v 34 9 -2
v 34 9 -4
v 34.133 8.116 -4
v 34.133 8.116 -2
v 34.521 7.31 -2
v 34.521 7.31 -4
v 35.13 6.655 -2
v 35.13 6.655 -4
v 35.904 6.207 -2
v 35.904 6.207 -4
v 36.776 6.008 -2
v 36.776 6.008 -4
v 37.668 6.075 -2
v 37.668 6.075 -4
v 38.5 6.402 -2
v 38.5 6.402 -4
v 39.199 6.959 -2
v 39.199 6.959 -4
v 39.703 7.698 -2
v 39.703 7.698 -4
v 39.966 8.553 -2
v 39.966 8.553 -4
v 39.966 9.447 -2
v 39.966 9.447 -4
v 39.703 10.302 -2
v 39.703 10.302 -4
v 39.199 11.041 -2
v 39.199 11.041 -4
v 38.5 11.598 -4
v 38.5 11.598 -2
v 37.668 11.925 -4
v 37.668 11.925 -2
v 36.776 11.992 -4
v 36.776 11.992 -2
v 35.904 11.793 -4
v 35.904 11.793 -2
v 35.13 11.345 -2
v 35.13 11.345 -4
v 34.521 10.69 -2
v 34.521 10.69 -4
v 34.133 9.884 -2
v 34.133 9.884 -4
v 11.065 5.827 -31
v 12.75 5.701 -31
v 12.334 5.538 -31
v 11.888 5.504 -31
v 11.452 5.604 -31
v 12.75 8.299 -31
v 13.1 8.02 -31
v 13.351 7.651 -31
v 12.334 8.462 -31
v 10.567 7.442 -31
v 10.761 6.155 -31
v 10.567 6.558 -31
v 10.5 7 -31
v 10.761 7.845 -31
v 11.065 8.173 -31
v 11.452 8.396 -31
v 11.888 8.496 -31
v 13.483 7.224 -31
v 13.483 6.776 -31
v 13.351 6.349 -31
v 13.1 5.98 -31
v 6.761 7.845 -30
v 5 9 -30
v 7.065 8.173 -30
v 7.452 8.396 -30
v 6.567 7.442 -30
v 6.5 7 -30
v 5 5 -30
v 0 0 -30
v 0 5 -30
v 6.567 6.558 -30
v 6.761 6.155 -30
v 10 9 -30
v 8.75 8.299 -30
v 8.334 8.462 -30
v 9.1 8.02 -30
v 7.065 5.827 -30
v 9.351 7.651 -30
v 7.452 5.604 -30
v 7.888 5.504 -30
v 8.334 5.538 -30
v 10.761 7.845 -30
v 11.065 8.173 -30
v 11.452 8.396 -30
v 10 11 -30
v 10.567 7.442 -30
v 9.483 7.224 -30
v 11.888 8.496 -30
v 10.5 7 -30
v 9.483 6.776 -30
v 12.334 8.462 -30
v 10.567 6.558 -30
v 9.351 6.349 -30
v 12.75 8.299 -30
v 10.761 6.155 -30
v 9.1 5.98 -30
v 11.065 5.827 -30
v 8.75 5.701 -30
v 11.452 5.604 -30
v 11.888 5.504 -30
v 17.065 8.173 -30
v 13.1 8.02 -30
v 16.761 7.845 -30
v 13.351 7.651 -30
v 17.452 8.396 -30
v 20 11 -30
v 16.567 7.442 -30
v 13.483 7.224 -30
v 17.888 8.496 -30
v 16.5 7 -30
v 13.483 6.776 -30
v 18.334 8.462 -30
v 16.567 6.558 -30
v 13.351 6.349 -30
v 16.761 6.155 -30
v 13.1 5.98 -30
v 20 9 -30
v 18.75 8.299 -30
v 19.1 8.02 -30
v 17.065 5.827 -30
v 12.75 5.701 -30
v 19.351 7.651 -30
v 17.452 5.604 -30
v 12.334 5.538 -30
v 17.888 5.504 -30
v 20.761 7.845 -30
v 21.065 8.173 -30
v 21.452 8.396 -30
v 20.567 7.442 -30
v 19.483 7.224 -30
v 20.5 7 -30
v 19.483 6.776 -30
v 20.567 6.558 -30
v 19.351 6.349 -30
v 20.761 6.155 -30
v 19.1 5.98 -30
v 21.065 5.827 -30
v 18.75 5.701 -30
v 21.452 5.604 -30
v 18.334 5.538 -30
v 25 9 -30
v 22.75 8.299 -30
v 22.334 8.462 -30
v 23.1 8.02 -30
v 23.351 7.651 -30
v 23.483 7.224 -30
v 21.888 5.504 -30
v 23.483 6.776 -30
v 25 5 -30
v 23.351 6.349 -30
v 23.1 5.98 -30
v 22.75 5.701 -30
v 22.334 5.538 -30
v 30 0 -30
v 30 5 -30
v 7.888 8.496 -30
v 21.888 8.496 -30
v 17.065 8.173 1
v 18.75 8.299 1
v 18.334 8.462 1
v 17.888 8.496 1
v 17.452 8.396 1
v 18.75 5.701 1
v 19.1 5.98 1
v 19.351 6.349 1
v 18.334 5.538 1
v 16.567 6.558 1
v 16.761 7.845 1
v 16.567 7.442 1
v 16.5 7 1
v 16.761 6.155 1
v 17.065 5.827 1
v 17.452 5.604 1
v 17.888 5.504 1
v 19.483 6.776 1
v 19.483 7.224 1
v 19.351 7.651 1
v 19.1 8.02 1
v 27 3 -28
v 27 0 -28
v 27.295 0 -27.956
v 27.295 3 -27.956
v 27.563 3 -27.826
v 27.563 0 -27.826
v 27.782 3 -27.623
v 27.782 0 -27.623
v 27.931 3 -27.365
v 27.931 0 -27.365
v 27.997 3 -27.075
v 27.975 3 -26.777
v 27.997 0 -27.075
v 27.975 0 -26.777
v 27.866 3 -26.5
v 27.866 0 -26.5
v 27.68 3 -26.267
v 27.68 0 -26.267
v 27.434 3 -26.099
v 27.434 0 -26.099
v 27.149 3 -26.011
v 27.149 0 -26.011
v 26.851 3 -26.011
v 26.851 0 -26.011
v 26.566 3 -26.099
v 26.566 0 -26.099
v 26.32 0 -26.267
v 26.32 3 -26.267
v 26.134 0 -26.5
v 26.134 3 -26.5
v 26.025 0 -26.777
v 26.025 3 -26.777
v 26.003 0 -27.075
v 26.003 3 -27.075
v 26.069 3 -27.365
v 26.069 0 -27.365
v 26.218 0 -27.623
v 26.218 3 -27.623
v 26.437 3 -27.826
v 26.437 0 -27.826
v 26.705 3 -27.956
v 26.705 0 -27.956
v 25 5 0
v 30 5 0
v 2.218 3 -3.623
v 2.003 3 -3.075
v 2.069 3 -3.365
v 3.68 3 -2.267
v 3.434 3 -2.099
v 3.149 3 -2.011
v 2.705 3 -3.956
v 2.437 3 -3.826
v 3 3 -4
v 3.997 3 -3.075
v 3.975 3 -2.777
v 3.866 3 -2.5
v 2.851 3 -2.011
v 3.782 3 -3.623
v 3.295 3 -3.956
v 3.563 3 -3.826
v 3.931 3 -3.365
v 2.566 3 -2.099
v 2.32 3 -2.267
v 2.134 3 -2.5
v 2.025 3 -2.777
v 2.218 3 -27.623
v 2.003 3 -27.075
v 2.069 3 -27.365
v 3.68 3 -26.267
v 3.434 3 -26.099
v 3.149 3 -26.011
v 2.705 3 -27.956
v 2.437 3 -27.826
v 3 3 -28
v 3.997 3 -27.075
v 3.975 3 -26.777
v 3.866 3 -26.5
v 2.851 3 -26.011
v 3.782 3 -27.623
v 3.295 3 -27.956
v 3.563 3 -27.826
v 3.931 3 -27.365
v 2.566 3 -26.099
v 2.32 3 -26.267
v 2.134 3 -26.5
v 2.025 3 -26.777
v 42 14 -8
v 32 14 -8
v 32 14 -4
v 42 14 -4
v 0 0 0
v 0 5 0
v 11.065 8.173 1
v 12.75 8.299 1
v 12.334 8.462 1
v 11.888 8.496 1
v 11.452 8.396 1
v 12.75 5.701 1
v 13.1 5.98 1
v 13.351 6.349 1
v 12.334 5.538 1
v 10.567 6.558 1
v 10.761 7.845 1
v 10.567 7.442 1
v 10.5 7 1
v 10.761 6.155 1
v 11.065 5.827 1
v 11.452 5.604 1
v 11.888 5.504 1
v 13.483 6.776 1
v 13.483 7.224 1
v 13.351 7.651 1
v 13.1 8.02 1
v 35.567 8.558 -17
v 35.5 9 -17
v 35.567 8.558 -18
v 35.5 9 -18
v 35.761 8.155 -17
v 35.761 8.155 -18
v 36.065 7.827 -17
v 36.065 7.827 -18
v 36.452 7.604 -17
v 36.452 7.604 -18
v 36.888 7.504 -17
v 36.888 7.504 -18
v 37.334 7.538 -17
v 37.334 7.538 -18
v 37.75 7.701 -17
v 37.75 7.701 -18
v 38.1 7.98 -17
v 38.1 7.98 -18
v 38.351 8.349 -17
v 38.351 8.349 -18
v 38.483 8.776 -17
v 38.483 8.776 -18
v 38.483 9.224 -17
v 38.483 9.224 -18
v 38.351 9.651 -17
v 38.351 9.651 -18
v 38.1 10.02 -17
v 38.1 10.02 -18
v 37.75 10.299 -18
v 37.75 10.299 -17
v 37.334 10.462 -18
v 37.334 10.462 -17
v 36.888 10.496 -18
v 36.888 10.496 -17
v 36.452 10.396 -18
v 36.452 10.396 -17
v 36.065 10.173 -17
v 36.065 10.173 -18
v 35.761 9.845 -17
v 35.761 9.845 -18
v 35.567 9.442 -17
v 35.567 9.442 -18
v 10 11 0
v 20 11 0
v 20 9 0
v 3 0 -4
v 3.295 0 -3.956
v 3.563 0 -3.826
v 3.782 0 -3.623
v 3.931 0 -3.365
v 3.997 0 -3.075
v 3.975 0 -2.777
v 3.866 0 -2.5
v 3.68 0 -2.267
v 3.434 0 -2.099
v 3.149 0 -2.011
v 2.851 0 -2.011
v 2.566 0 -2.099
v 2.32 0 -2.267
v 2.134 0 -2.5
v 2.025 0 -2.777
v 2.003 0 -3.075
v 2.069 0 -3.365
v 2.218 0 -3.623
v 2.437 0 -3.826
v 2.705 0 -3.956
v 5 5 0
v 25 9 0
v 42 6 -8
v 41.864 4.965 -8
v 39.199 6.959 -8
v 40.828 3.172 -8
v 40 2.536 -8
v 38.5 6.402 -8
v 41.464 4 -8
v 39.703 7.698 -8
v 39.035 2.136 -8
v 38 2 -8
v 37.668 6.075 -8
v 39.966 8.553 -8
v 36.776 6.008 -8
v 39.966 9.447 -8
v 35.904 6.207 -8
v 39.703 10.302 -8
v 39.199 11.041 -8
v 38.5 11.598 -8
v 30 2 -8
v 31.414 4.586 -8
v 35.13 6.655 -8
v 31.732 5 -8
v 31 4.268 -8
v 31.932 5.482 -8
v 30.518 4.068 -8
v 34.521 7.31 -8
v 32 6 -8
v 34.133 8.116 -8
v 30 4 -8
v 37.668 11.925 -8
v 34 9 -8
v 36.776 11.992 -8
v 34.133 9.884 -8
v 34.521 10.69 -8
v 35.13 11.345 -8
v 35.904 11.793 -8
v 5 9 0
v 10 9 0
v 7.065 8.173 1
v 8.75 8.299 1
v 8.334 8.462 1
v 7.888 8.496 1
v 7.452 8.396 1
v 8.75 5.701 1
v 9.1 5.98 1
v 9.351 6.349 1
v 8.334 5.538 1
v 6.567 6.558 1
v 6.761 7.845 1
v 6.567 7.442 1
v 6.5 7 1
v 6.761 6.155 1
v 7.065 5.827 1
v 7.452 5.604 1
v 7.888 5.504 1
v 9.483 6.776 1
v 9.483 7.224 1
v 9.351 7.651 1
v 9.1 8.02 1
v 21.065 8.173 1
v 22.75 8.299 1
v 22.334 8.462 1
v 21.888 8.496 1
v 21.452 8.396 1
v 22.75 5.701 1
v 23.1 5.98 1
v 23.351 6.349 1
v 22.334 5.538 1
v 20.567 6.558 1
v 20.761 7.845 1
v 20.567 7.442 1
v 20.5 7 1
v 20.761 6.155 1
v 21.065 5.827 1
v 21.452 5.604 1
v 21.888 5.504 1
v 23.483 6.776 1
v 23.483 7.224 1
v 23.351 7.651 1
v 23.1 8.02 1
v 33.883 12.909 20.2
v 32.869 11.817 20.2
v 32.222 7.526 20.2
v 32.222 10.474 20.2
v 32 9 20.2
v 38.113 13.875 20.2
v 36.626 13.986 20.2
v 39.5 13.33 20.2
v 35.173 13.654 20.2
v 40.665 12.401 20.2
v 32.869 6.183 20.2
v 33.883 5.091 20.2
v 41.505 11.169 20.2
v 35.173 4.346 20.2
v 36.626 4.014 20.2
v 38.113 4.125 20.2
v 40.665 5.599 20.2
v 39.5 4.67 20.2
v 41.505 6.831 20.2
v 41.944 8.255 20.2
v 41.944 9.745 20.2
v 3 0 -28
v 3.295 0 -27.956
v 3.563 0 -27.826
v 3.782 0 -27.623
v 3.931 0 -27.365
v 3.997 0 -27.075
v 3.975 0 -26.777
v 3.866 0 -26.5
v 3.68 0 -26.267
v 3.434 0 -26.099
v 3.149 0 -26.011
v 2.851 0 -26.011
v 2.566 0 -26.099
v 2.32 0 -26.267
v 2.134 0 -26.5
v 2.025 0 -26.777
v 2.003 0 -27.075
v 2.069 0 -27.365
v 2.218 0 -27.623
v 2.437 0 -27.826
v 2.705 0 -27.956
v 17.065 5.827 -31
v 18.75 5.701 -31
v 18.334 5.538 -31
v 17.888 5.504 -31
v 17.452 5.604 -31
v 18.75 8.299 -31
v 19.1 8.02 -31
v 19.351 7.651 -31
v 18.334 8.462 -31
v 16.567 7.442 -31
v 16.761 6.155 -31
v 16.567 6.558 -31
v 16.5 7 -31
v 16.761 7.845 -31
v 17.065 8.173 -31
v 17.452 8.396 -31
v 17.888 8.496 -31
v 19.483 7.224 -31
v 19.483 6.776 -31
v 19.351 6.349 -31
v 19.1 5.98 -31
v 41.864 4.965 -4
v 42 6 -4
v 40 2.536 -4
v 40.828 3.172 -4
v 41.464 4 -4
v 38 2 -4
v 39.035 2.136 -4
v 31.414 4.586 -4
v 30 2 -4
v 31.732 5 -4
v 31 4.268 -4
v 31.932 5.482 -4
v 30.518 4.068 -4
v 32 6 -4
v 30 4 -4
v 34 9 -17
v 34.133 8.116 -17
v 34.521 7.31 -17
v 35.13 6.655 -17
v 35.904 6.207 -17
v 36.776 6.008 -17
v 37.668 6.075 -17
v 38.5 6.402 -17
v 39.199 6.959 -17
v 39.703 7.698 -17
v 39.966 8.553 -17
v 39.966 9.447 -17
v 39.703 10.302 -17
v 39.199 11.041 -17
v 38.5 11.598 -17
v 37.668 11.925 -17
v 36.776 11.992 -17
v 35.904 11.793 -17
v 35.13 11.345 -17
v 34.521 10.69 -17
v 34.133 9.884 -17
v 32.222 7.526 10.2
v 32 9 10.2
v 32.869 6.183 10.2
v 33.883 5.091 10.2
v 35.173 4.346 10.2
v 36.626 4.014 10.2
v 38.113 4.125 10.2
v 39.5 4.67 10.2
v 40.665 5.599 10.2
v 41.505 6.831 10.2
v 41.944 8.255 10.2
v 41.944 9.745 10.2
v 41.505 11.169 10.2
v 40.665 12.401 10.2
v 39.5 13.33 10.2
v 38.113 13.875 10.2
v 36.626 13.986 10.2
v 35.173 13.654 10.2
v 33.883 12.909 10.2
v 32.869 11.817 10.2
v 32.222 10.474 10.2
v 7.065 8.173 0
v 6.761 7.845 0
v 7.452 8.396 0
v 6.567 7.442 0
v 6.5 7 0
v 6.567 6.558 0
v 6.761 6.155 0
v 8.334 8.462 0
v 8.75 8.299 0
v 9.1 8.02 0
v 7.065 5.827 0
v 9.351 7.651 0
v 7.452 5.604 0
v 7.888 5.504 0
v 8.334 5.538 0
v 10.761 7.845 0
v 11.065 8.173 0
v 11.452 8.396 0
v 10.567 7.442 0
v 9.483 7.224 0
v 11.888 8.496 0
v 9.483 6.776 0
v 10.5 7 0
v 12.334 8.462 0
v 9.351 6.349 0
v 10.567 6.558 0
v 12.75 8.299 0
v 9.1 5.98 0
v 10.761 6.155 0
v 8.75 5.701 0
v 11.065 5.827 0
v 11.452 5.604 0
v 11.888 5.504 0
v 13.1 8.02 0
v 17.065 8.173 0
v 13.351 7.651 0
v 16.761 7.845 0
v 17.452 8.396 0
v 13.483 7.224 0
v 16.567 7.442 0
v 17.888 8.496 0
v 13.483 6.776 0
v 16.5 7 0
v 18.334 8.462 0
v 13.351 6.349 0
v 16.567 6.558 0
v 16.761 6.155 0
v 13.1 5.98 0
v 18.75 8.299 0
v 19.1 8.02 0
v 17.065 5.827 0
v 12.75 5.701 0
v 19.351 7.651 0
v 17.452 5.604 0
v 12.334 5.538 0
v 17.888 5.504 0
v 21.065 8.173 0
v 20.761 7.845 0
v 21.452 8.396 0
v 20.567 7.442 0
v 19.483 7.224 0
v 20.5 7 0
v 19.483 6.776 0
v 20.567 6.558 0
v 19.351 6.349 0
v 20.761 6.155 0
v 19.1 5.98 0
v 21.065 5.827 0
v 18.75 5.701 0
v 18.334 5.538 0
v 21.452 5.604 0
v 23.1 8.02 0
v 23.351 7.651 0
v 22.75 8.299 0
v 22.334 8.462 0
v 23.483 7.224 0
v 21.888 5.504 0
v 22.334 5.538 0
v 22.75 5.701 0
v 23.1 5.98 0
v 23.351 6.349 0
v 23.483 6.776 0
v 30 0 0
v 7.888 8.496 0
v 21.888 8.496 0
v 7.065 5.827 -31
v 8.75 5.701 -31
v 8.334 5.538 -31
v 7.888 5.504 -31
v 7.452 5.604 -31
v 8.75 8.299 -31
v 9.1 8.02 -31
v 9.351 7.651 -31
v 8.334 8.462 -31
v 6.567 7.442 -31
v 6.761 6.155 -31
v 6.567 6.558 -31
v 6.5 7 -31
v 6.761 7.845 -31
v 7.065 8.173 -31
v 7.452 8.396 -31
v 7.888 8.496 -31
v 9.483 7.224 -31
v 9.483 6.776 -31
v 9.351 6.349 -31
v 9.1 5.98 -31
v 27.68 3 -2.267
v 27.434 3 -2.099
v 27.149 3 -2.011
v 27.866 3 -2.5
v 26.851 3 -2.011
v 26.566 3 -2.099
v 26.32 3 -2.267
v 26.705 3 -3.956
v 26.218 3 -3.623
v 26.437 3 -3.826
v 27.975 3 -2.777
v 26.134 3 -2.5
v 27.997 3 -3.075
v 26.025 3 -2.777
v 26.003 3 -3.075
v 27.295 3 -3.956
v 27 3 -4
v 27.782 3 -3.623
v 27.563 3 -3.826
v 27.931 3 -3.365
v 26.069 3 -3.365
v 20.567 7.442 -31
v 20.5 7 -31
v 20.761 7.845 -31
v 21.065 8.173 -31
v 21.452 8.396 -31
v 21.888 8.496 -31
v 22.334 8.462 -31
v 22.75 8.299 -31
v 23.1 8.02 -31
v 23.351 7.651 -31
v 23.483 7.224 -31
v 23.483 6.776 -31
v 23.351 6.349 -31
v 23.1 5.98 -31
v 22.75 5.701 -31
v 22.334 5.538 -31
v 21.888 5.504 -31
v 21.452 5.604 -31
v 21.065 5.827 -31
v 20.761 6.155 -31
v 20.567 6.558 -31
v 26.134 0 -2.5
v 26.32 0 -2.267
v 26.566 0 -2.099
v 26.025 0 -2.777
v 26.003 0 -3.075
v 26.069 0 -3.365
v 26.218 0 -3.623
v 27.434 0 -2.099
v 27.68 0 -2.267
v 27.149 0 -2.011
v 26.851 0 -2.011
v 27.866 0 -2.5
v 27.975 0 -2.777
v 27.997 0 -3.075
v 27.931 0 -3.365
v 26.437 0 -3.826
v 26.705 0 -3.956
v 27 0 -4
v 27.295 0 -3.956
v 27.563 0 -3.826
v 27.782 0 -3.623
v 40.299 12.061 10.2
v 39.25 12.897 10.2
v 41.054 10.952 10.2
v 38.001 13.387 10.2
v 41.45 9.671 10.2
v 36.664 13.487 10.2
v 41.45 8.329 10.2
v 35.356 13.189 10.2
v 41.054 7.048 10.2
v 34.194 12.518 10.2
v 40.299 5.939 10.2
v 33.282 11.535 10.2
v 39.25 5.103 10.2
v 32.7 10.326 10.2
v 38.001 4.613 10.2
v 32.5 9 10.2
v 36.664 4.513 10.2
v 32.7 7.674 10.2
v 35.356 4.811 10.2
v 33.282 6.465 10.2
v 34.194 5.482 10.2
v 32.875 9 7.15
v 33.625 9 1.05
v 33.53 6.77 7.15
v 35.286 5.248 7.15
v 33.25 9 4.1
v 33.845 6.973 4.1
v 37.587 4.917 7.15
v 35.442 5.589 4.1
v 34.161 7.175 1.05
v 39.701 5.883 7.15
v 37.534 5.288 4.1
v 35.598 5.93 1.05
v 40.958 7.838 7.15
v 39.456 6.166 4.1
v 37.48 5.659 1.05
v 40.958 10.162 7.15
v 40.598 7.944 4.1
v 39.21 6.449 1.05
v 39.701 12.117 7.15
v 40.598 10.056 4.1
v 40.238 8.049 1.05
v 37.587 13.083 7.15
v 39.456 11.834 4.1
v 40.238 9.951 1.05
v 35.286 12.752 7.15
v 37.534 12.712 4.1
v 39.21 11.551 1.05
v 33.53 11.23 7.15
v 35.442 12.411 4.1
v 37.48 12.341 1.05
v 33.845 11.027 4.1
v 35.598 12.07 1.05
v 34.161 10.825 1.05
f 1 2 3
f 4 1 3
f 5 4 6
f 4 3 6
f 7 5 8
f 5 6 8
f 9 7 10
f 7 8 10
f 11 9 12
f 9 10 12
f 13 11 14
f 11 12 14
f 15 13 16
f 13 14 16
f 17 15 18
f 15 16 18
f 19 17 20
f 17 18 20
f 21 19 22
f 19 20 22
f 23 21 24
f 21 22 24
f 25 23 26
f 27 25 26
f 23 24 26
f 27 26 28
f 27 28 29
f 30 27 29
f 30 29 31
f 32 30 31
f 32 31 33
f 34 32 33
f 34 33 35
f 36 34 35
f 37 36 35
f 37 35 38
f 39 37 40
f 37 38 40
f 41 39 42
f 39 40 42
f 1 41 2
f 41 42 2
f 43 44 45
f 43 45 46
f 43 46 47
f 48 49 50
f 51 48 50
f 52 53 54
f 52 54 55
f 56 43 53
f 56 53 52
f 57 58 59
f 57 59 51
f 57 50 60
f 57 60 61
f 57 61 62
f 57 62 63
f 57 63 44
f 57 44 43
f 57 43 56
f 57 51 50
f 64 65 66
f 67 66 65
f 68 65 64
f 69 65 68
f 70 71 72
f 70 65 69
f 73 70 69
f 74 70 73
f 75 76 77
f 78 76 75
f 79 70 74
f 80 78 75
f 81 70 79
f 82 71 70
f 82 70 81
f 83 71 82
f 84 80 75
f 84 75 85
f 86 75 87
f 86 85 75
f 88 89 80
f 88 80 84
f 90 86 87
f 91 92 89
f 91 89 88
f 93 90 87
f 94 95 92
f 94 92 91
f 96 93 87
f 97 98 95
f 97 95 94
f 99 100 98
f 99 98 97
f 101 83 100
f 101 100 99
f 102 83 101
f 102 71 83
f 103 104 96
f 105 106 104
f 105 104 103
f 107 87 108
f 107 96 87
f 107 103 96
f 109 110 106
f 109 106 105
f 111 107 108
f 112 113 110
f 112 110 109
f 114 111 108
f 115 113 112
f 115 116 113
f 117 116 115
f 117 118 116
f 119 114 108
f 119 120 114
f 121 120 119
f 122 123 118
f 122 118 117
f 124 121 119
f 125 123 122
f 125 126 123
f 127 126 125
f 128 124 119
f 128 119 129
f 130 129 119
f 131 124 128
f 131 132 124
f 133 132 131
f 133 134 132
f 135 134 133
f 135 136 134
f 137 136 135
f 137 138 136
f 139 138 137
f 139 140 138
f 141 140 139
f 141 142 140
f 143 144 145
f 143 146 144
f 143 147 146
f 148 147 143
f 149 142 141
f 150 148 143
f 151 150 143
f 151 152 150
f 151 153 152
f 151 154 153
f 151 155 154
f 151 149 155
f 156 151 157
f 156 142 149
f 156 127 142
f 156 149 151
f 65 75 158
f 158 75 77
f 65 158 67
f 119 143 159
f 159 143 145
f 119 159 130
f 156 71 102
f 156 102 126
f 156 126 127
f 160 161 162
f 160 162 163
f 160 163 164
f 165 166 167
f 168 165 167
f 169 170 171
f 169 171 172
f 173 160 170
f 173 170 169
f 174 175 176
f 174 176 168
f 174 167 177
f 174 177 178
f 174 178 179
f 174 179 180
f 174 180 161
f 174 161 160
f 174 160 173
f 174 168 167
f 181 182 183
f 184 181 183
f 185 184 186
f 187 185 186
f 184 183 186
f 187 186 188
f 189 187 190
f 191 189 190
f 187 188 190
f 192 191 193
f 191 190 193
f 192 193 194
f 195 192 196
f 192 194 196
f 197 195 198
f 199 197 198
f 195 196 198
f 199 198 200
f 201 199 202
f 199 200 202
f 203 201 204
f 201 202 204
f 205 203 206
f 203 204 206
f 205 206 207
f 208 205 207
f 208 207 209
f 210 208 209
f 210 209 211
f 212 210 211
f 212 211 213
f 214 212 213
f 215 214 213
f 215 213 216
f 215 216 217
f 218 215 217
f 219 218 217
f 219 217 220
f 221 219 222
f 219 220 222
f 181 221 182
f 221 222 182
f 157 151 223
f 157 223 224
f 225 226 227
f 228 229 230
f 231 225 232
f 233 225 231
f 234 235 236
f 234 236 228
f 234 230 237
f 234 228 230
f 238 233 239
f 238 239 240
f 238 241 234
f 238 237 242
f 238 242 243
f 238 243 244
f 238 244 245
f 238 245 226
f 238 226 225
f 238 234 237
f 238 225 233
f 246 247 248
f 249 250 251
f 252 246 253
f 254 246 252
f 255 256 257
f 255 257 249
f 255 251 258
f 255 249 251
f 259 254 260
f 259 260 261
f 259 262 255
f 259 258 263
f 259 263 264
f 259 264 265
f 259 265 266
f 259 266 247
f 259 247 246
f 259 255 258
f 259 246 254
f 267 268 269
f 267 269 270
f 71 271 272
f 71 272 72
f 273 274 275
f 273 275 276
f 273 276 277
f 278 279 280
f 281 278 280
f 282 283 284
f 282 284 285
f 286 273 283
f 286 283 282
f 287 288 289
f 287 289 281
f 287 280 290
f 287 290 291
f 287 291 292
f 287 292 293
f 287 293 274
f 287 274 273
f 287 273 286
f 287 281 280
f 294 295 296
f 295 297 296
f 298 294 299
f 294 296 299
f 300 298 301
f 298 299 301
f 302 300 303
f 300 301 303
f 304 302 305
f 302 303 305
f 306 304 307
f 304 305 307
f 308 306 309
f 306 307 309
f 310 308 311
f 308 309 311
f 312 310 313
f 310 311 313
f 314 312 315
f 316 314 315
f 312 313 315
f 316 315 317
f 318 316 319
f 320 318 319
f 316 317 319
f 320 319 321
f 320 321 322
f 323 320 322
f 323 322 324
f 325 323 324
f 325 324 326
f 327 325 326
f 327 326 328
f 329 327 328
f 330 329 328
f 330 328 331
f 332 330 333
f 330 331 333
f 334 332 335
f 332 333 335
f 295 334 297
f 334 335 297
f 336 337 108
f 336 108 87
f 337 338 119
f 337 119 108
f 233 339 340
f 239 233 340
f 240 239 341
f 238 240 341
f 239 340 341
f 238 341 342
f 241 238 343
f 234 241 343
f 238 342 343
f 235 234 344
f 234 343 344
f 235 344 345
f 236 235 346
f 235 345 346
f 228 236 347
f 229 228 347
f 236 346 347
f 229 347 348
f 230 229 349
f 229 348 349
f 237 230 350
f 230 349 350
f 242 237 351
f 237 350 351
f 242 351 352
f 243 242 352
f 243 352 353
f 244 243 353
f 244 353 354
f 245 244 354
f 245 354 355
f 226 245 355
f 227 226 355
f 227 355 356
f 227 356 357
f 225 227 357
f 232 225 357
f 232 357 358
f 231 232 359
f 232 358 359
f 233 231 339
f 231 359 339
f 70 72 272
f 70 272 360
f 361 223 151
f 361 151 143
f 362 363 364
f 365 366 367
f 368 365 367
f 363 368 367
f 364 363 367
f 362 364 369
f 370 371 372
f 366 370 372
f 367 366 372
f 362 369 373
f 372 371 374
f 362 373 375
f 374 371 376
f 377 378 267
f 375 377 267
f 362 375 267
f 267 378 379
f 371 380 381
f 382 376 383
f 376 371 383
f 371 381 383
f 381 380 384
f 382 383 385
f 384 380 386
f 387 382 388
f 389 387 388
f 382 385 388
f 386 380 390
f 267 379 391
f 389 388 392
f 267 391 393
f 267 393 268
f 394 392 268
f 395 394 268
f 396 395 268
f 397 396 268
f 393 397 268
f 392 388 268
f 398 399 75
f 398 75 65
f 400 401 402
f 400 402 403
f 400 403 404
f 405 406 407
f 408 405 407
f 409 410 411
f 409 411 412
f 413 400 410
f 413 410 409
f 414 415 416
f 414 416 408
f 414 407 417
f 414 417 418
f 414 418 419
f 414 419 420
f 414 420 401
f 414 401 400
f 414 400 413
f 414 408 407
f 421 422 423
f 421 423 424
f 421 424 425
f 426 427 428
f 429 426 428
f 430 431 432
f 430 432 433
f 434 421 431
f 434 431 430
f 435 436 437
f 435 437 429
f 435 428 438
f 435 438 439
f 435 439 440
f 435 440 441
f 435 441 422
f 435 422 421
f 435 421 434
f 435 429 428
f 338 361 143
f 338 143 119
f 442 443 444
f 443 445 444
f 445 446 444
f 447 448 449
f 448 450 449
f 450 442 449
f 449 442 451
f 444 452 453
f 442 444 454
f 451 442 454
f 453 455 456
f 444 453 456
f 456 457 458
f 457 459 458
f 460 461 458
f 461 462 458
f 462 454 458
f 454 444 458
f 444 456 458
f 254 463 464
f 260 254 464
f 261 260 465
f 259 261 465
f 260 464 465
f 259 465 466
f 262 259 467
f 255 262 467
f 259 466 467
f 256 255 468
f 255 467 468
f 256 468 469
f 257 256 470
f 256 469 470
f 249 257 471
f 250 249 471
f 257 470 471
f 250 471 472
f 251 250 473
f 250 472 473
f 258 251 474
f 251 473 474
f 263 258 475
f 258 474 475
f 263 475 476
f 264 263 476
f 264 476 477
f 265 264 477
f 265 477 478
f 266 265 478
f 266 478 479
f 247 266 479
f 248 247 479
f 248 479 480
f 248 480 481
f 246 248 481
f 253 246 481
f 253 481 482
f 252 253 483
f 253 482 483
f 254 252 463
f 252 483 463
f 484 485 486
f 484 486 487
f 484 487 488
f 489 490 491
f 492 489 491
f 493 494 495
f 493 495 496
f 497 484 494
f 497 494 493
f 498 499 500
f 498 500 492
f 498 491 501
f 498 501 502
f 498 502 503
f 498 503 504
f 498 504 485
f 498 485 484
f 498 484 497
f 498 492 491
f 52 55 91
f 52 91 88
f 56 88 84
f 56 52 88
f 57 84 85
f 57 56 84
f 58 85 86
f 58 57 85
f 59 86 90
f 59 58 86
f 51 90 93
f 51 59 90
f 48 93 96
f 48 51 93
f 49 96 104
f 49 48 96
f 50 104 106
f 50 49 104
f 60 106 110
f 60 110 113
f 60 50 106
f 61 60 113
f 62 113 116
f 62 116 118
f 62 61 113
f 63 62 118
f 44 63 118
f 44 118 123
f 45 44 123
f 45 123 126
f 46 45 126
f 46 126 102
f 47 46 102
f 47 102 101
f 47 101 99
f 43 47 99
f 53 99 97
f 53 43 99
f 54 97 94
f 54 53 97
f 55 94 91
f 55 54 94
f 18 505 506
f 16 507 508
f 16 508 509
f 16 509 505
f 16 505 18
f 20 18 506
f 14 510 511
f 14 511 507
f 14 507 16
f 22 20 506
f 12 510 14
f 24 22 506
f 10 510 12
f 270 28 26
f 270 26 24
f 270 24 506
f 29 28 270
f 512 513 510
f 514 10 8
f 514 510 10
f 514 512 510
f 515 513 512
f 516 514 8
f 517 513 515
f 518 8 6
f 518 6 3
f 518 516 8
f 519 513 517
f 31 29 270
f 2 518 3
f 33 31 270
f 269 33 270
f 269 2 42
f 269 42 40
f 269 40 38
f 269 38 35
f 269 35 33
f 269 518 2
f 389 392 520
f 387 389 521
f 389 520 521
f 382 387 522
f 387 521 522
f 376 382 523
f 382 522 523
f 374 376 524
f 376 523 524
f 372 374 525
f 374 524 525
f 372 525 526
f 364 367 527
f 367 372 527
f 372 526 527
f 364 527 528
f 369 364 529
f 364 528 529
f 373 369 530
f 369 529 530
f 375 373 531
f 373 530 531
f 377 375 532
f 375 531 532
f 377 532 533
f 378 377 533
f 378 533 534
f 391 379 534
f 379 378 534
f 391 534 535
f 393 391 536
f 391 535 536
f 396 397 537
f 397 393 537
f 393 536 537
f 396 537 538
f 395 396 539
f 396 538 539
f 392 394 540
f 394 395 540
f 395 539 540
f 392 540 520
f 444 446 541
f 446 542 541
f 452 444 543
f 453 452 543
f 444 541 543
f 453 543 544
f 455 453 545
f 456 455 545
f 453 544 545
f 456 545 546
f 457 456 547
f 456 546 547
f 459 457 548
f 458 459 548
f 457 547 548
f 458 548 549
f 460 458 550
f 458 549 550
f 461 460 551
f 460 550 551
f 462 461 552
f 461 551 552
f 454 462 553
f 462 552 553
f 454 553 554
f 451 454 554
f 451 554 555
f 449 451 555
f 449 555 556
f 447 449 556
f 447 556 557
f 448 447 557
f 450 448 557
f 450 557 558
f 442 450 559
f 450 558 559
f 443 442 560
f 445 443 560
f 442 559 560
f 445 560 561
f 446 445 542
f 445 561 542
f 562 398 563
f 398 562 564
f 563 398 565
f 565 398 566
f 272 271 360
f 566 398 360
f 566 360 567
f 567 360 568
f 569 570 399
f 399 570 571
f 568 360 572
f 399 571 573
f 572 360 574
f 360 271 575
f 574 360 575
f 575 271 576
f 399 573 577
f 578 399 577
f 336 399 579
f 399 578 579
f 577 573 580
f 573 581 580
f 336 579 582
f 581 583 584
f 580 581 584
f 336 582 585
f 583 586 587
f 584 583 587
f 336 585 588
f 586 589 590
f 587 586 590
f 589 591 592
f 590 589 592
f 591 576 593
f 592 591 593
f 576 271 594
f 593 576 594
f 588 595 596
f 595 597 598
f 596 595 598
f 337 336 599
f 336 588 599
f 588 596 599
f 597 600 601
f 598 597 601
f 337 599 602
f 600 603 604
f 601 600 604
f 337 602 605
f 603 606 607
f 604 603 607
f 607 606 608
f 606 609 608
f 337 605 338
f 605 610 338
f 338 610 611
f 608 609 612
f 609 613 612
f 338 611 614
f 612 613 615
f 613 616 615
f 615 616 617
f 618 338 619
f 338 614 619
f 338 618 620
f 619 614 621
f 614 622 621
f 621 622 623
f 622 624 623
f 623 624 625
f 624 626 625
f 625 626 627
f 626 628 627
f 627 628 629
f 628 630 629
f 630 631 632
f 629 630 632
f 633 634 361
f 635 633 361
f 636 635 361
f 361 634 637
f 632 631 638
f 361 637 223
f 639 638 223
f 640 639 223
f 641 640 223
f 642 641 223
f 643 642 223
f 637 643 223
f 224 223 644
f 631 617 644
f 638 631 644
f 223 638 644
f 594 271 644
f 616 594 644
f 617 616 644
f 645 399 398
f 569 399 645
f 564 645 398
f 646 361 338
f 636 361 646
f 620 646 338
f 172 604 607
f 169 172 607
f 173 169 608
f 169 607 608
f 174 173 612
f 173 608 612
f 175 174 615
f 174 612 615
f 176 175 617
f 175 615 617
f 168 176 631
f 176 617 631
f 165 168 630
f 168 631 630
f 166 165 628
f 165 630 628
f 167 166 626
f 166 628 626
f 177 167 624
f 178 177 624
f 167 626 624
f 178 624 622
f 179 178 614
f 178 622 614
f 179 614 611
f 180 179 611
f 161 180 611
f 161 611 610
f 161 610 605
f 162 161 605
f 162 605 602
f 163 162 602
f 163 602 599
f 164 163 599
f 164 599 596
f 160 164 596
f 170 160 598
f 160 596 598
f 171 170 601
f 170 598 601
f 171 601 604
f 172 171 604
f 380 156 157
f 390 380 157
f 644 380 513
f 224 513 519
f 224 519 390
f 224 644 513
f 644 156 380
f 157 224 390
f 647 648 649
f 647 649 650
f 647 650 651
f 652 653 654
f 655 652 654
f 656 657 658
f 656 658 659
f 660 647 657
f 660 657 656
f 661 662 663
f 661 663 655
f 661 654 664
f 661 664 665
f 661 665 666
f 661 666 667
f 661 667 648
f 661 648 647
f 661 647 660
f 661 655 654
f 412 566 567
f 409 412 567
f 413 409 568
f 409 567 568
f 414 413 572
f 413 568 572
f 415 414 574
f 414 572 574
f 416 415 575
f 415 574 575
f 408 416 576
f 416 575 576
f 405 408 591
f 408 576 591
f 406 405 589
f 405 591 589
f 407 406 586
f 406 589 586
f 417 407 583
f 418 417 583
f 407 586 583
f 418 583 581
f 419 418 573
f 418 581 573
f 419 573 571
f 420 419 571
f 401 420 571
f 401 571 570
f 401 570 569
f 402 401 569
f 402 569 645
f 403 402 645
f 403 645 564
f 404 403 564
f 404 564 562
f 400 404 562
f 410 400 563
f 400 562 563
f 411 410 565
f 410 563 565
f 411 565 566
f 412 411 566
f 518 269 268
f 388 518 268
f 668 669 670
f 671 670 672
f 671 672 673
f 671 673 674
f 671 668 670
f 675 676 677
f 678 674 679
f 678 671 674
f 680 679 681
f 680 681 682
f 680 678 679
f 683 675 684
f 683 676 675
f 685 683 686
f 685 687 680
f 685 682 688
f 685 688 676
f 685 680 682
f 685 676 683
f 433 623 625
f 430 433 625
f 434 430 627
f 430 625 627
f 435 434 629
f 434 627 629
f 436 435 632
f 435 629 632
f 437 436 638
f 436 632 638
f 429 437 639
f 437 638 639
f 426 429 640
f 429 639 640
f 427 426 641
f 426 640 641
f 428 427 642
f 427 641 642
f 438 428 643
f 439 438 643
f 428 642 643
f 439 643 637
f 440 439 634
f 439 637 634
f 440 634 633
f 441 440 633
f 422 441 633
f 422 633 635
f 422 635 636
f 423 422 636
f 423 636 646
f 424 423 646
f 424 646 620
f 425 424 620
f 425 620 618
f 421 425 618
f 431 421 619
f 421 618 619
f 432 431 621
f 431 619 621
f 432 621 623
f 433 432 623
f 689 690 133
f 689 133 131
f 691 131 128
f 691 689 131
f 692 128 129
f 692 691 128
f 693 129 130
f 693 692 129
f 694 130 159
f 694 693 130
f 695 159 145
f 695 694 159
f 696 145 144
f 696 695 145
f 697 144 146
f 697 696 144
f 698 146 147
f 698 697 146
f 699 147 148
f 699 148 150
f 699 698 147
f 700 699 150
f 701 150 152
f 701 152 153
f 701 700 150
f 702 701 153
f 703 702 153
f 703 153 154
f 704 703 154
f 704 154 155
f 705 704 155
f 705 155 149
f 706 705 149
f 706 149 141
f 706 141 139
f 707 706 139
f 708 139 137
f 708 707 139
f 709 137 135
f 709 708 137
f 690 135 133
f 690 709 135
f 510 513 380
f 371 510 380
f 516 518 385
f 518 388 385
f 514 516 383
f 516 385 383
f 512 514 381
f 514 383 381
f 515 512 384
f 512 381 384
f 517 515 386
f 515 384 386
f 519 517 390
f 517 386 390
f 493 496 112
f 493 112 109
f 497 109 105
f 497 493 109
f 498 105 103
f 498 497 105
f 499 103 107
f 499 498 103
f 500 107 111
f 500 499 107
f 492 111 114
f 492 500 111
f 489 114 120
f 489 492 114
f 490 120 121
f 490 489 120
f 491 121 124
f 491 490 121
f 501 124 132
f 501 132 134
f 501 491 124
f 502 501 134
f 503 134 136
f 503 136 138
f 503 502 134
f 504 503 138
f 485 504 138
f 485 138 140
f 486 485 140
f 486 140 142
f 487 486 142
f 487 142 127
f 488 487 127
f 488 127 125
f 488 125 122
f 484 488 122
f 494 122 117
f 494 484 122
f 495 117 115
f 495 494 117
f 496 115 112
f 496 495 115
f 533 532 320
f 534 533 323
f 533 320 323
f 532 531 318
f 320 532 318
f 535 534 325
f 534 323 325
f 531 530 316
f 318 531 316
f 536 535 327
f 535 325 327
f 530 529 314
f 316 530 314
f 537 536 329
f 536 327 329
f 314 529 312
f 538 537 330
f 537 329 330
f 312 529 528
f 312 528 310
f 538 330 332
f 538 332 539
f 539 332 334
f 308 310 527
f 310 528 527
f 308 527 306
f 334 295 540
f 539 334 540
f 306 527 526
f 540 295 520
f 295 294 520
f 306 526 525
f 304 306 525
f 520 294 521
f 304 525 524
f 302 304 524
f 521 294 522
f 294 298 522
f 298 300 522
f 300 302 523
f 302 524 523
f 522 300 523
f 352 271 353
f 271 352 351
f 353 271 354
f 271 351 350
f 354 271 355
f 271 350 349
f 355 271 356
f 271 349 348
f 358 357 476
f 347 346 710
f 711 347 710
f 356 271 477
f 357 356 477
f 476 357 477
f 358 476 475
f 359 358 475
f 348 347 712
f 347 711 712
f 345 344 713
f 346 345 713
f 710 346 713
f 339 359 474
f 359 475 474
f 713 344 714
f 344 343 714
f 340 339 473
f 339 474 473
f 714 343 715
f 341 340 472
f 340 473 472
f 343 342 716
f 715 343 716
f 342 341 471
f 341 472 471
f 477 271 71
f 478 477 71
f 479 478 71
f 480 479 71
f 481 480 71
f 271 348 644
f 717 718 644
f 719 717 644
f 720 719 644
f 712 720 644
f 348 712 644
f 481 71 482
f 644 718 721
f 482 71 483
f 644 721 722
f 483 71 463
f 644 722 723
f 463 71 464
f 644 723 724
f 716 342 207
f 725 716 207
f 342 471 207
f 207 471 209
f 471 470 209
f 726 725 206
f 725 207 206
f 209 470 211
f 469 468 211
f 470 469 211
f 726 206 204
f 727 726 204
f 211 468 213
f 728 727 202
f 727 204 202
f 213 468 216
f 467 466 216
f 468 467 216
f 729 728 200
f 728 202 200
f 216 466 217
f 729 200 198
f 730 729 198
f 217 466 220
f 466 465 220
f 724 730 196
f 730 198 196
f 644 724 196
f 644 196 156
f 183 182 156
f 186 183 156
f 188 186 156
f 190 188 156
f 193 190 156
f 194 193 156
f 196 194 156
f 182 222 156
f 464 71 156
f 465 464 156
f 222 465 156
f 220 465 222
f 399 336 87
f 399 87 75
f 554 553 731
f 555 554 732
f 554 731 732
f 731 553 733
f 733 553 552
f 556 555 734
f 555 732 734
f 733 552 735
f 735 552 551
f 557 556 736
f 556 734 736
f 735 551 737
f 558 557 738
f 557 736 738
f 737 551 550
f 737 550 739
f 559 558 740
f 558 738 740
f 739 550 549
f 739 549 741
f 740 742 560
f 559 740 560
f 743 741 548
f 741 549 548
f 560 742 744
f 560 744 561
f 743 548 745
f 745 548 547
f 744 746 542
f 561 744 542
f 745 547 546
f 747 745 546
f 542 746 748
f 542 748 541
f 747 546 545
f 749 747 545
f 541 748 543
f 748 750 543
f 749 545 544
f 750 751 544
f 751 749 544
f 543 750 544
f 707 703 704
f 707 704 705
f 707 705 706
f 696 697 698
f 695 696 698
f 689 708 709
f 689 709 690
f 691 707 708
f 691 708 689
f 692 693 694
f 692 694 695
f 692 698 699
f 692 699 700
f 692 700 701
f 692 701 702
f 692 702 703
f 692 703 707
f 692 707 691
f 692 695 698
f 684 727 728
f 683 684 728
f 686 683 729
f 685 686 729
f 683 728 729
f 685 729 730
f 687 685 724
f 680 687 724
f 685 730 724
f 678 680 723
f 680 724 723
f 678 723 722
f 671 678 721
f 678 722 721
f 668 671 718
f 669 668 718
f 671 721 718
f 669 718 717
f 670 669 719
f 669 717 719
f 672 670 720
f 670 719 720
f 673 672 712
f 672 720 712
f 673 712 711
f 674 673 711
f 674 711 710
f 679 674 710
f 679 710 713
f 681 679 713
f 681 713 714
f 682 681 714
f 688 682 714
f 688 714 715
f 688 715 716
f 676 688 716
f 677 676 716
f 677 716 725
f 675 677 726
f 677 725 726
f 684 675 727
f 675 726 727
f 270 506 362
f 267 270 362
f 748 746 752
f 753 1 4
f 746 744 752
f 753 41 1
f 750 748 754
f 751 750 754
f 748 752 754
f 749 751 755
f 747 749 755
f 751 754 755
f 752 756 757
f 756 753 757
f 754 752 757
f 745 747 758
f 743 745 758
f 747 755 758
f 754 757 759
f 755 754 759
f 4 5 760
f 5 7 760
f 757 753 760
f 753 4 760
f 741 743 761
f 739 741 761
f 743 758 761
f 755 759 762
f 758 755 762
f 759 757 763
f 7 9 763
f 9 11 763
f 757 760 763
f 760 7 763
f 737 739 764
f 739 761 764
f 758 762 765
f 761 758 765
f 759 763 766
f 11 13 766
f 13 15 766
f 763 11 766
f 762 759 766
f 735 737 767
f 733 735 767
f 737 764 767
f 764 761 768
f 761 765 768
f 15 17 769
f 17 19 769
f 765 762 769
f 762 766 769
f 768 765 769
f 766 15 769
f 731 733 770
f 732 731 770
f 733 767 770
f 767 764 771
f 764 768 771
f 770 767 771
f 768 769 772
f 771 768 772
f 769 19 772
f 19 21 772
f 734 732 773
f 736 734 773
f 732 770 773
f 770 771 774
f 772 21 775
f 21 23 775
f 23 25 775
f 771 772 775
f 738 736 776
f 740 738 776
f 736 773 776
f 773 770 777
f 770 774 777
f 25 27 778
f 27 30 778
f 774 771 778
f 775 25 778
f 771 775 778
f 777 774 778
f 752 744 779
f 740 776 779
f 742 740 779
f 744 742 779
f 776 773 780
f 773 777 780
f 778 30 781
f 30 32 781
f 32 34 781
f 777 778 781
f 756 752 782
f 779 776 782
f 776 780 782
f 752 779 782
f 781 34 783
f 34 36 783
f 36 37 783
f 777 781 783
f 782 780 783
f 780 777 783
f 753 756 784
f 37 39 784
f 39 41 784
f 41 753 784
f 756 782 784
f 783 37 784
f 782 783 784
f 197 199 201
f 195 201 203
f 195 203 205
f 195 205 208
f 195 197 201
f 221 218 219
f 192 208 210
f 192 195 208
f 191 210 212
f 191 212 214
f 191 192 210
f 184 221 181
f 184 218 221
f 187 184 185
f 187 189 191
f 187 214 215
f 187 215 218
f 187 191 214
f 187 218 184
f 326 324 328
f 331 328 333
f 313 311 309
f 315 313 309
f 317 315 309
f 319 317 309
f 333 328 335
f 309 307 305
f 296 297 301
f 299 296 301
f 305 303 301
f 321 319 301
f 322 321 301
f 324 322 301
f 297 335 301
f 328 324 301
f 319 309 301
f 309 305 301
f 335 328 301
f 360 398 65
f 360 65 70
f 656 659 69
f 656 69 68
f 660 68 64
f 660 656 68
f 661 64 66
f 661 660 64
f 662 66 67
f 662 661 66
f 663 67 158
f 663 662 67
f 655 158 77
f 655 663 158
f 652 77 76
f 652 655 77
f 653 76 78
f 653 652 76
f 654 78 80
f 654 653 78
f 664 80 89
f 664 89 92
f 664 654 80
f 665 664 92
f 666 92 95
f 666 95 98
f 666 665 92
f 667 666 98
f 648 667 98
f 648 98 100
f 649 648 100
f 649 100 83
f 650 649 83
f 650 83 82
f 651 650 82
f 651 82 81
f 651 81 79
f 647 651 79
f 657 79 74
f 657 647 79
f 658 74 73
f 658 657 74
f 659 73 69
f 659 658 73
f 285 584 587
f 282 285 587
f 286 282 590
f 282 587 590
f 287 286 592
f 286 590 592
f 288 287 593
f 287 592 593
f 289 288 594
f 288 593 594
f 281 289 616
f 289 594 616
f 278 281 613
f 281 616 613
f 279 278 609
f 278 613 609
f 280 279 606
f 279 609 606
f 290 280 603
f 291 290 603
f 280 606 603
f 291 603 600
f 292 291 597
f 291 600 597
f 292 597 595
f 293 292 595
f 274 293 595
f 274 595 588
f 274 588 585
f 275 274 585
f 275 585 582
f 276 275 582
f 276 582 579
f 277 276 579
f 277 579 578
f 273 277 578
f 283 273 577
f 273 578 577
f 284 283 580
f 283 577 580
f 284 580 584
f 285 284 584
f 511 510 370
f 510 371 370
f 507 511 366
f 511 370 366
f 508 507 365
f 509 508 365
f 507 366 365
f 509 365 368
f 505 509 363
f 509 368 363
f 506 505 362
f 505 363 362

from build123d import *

# Parameters (mm, degrees)
SKETCH_2_W          = 30
SKETCH_2_H          = 30
EXTRUDE_1_DEPTH     = 5
SKETCH_3_R          = 1
CUT_EXTRUDE_1_DEPTH = 3
EXTRUDE_2_DEPTH     = 30
SKETCH_6_W          = 15
SKETCH_6_H          = 2
EXTRUDE_3_DEPTH     = 8
SKETCH_7_W          = 10
SKETCH_7_H          = 4
EXTRUDE_4_DEPTH     = 10
SKETCH_10_W         = 8
SKETCH_10_H         = 2
CUT_EXTRUDE_2_DEPTH = 7
SKETCH_11_W         = 8
SKETCH_11_H         = 2
CUT_EXTRUDE_3_DEPTH = 4
SKETCH_12_W         = 4
SKETCH_12_H         = 2
EXTRUDE_5_DEPTH     = 4
FILLET_1_R          = 4
FILLET_2_R          = 2
SKETCH_13_R         = 1.5
EXTRUDE_6_DEPTH     = 1
EXTRUDE_START       = 1
SKETCH_14_R         = 1.5
EXTRUDE_7_DEPTH     = 1


with BuildPart() as part:
    # Эскиз2 → Бобышка-Вытянуть1 (new body)
    with BuildSketch(Plane(origin=(0, 0, 0), x_dir=(1, 0, 0), z_dir=(0, 1, 0))):
        with Locations((15, 15)):
            Rectangle(SKETCH_2_W, SKETCH_2_H)
    extrude(amount=EXTRUDE_1_DEPTH)

    # Эскиз3 → Вырез-Вытянуть1 (cut)
    with BuildSketch(Plane.XZ):
        with Locations(Location((27, -3, 0), (0, 0, 270))):
            Circle(SKETCH_3_R)
        with Locations(Location((27, -27, 0), (0, 0, 270))):
            Circle(SKETCH_3_R)
        with Locations(Location((3, -27, 0), (0, 0, 270))):
            Circle(SKETCH_3_R)
        with Locations(Location((3, -3, 0), (0, 0, 270))):
            Circle(SKETCH_3_R)
    extrude(amount=-CUT_EXTRUDE_1_DEPTH, mode=Mode.SUBTRACT)

    # Эскиз5 → Бобышка-Вытянуть2 (add)
    with BuildSketch(Plane.XY):
        Polygon((10, 9), (5, 9), (5, 5), (25, 5), (25, 9), (20, 9), (20, 11), (10, 11), align=None)
    extrude(amount=-EXTRUDE_2_DEPTH)

    # Эскиз6 → Бобышка-Вытянуть3 (add)
    with BuildSketch(Plane(origin=(30, 0, 0), x_dir=(0, 0, -1), z_dir=(1, 0, 0))):
        with Locations((7.5, 3)):
            Rectangle(SKETCH_6_W, SKETCH_6_H)
    extrude(amount=EXTRUDE_3_DEPTH)

    # Эскиз7 → Бобышка-Вытянуть4 (add)
    with BuildSketch(Plane(origin=(0, 4, 0), x_dir=(1, 0, 0), z_dir=(0, 1, 0))):
        with Locations((37, 6)):
            Rectangle(SKETCH_7_W, SKETCH_7_H)
    extrude(amount=EXTRUDE_4_DEPTH)

    # Эскиз9 → Повернуть1 (revolve)
    with BuildSketch(Plane.ZY.offset(-37), mode=Mode.PRIVATE) as revolve_1_sk:
        Polygon((20.2, 9), (20.2, 14), (10.2, 14), (10.2, 13.5), (-2, 12), (-17, 12), (-17, 10.5), (-18, 10.5), (-18, 9), align=None)
    revolve(revolve_1_sk.sketch.rotate(Axis((37, 9, -4), (0, 0, 1)), 90), axis=Axis((37, 9, -4), (0, 0, 1)))

    # Эскиз10 → Вырез-Вытянуть2 (cut)
    with BuildSketch(Plane(origin=(0, 0, -15), x_dir=(-1, 0, 0), z_dir=(0, 0, -1))):
        with Locations((-34, 3)):
            Rectangle(SKETCH_10_W, SKETCH_10_H)
    extrude(amount=-CUT_EXTRUDE_2_DEPTH, mode=Mode.SUBTRACT)

    # Эскиз11 → Вырез-Вытянуть3 (cut)
    with BuildSketch(Plane.XY):
        with Locations((34, 3)):
            Rectangle(SKETCH_11_W, SKETCH_11_H)
    extrude(amount=-CUT_EXTRUDE_3_DEPTH, mode=Mode.SUBTRACT)

    # Эскиз12 → Бобышка-Вытянуть5 (add)
    with BuildSketch(Plane(origin=(38, 0, 0), x_dir=(0, 0, -1), z_dir=(1, 0, 0))):
        with Locations((6, 3)):
            Rectangle(SKETCH_12_W, SKETCH_12_H)
    extrude(amount=EXTRUDE_5_DEPTH)

    # Скругление1
    fillet_1_edges = [part.edges().sort_by_distance(p)[0] for p in [
        (42, 2, -6),
    ]]
    fillet(fillet_1_edges, radius=FILLET_1_R)

    # Скругление2
    fillet_2_edges = [part.edges().sort_by_distance(p)[0] for p in [
        (32, 4, -6),
    ]]
    fillet(fillet_2_edges, radius=FILLET_2_R - 0.0001)  # a hair under: the kernel refuses the full size

    # Эскиз13 → Бобышка-Вытянуть6 (add)
    with BuildSketch(Plane.XY):
        with Locations(Location((8, 7, 0), (0, 0, 180))):
            Circle(SKETCH_13_R)
        with Locations(Location((12, 7, 0), (0, 0, 180))):
            Circle(SKETCH_13_R)
        with Locations(Location((22, 7, 0), (0, 0, 180))):
            Circle(SKETCH_13_R)
        with Locations(Location((18, 7, 0), (0, 0, 180))):
            Circle(SKETCH_13_R)
    extrude(amount=EXTRUDE_6_DEPTH)

    # Эскиз14 → Бобышка-Вытянуть7 (add)
    with BuildSketch(Plane(origin=(0, 0, -30), x_dir=(-1, 0, 0), z_dir=(0, 0, -1)).offset(EXTRUDE_START)):
        with Locations((-8, 7)):
            Circle(SKETCH_14_R)
        with Locations((-12, 7)):
            Circle(SKETCH_14_R)
        with Locations((-18, 7)):
            Circle(SKETCH_14_R)
        with Locations((-22, 7)):
            Circle(SKETCH_14_R)
    extrude(amount=-EXTRUDE_7_DEPTH)


solid = part.part
